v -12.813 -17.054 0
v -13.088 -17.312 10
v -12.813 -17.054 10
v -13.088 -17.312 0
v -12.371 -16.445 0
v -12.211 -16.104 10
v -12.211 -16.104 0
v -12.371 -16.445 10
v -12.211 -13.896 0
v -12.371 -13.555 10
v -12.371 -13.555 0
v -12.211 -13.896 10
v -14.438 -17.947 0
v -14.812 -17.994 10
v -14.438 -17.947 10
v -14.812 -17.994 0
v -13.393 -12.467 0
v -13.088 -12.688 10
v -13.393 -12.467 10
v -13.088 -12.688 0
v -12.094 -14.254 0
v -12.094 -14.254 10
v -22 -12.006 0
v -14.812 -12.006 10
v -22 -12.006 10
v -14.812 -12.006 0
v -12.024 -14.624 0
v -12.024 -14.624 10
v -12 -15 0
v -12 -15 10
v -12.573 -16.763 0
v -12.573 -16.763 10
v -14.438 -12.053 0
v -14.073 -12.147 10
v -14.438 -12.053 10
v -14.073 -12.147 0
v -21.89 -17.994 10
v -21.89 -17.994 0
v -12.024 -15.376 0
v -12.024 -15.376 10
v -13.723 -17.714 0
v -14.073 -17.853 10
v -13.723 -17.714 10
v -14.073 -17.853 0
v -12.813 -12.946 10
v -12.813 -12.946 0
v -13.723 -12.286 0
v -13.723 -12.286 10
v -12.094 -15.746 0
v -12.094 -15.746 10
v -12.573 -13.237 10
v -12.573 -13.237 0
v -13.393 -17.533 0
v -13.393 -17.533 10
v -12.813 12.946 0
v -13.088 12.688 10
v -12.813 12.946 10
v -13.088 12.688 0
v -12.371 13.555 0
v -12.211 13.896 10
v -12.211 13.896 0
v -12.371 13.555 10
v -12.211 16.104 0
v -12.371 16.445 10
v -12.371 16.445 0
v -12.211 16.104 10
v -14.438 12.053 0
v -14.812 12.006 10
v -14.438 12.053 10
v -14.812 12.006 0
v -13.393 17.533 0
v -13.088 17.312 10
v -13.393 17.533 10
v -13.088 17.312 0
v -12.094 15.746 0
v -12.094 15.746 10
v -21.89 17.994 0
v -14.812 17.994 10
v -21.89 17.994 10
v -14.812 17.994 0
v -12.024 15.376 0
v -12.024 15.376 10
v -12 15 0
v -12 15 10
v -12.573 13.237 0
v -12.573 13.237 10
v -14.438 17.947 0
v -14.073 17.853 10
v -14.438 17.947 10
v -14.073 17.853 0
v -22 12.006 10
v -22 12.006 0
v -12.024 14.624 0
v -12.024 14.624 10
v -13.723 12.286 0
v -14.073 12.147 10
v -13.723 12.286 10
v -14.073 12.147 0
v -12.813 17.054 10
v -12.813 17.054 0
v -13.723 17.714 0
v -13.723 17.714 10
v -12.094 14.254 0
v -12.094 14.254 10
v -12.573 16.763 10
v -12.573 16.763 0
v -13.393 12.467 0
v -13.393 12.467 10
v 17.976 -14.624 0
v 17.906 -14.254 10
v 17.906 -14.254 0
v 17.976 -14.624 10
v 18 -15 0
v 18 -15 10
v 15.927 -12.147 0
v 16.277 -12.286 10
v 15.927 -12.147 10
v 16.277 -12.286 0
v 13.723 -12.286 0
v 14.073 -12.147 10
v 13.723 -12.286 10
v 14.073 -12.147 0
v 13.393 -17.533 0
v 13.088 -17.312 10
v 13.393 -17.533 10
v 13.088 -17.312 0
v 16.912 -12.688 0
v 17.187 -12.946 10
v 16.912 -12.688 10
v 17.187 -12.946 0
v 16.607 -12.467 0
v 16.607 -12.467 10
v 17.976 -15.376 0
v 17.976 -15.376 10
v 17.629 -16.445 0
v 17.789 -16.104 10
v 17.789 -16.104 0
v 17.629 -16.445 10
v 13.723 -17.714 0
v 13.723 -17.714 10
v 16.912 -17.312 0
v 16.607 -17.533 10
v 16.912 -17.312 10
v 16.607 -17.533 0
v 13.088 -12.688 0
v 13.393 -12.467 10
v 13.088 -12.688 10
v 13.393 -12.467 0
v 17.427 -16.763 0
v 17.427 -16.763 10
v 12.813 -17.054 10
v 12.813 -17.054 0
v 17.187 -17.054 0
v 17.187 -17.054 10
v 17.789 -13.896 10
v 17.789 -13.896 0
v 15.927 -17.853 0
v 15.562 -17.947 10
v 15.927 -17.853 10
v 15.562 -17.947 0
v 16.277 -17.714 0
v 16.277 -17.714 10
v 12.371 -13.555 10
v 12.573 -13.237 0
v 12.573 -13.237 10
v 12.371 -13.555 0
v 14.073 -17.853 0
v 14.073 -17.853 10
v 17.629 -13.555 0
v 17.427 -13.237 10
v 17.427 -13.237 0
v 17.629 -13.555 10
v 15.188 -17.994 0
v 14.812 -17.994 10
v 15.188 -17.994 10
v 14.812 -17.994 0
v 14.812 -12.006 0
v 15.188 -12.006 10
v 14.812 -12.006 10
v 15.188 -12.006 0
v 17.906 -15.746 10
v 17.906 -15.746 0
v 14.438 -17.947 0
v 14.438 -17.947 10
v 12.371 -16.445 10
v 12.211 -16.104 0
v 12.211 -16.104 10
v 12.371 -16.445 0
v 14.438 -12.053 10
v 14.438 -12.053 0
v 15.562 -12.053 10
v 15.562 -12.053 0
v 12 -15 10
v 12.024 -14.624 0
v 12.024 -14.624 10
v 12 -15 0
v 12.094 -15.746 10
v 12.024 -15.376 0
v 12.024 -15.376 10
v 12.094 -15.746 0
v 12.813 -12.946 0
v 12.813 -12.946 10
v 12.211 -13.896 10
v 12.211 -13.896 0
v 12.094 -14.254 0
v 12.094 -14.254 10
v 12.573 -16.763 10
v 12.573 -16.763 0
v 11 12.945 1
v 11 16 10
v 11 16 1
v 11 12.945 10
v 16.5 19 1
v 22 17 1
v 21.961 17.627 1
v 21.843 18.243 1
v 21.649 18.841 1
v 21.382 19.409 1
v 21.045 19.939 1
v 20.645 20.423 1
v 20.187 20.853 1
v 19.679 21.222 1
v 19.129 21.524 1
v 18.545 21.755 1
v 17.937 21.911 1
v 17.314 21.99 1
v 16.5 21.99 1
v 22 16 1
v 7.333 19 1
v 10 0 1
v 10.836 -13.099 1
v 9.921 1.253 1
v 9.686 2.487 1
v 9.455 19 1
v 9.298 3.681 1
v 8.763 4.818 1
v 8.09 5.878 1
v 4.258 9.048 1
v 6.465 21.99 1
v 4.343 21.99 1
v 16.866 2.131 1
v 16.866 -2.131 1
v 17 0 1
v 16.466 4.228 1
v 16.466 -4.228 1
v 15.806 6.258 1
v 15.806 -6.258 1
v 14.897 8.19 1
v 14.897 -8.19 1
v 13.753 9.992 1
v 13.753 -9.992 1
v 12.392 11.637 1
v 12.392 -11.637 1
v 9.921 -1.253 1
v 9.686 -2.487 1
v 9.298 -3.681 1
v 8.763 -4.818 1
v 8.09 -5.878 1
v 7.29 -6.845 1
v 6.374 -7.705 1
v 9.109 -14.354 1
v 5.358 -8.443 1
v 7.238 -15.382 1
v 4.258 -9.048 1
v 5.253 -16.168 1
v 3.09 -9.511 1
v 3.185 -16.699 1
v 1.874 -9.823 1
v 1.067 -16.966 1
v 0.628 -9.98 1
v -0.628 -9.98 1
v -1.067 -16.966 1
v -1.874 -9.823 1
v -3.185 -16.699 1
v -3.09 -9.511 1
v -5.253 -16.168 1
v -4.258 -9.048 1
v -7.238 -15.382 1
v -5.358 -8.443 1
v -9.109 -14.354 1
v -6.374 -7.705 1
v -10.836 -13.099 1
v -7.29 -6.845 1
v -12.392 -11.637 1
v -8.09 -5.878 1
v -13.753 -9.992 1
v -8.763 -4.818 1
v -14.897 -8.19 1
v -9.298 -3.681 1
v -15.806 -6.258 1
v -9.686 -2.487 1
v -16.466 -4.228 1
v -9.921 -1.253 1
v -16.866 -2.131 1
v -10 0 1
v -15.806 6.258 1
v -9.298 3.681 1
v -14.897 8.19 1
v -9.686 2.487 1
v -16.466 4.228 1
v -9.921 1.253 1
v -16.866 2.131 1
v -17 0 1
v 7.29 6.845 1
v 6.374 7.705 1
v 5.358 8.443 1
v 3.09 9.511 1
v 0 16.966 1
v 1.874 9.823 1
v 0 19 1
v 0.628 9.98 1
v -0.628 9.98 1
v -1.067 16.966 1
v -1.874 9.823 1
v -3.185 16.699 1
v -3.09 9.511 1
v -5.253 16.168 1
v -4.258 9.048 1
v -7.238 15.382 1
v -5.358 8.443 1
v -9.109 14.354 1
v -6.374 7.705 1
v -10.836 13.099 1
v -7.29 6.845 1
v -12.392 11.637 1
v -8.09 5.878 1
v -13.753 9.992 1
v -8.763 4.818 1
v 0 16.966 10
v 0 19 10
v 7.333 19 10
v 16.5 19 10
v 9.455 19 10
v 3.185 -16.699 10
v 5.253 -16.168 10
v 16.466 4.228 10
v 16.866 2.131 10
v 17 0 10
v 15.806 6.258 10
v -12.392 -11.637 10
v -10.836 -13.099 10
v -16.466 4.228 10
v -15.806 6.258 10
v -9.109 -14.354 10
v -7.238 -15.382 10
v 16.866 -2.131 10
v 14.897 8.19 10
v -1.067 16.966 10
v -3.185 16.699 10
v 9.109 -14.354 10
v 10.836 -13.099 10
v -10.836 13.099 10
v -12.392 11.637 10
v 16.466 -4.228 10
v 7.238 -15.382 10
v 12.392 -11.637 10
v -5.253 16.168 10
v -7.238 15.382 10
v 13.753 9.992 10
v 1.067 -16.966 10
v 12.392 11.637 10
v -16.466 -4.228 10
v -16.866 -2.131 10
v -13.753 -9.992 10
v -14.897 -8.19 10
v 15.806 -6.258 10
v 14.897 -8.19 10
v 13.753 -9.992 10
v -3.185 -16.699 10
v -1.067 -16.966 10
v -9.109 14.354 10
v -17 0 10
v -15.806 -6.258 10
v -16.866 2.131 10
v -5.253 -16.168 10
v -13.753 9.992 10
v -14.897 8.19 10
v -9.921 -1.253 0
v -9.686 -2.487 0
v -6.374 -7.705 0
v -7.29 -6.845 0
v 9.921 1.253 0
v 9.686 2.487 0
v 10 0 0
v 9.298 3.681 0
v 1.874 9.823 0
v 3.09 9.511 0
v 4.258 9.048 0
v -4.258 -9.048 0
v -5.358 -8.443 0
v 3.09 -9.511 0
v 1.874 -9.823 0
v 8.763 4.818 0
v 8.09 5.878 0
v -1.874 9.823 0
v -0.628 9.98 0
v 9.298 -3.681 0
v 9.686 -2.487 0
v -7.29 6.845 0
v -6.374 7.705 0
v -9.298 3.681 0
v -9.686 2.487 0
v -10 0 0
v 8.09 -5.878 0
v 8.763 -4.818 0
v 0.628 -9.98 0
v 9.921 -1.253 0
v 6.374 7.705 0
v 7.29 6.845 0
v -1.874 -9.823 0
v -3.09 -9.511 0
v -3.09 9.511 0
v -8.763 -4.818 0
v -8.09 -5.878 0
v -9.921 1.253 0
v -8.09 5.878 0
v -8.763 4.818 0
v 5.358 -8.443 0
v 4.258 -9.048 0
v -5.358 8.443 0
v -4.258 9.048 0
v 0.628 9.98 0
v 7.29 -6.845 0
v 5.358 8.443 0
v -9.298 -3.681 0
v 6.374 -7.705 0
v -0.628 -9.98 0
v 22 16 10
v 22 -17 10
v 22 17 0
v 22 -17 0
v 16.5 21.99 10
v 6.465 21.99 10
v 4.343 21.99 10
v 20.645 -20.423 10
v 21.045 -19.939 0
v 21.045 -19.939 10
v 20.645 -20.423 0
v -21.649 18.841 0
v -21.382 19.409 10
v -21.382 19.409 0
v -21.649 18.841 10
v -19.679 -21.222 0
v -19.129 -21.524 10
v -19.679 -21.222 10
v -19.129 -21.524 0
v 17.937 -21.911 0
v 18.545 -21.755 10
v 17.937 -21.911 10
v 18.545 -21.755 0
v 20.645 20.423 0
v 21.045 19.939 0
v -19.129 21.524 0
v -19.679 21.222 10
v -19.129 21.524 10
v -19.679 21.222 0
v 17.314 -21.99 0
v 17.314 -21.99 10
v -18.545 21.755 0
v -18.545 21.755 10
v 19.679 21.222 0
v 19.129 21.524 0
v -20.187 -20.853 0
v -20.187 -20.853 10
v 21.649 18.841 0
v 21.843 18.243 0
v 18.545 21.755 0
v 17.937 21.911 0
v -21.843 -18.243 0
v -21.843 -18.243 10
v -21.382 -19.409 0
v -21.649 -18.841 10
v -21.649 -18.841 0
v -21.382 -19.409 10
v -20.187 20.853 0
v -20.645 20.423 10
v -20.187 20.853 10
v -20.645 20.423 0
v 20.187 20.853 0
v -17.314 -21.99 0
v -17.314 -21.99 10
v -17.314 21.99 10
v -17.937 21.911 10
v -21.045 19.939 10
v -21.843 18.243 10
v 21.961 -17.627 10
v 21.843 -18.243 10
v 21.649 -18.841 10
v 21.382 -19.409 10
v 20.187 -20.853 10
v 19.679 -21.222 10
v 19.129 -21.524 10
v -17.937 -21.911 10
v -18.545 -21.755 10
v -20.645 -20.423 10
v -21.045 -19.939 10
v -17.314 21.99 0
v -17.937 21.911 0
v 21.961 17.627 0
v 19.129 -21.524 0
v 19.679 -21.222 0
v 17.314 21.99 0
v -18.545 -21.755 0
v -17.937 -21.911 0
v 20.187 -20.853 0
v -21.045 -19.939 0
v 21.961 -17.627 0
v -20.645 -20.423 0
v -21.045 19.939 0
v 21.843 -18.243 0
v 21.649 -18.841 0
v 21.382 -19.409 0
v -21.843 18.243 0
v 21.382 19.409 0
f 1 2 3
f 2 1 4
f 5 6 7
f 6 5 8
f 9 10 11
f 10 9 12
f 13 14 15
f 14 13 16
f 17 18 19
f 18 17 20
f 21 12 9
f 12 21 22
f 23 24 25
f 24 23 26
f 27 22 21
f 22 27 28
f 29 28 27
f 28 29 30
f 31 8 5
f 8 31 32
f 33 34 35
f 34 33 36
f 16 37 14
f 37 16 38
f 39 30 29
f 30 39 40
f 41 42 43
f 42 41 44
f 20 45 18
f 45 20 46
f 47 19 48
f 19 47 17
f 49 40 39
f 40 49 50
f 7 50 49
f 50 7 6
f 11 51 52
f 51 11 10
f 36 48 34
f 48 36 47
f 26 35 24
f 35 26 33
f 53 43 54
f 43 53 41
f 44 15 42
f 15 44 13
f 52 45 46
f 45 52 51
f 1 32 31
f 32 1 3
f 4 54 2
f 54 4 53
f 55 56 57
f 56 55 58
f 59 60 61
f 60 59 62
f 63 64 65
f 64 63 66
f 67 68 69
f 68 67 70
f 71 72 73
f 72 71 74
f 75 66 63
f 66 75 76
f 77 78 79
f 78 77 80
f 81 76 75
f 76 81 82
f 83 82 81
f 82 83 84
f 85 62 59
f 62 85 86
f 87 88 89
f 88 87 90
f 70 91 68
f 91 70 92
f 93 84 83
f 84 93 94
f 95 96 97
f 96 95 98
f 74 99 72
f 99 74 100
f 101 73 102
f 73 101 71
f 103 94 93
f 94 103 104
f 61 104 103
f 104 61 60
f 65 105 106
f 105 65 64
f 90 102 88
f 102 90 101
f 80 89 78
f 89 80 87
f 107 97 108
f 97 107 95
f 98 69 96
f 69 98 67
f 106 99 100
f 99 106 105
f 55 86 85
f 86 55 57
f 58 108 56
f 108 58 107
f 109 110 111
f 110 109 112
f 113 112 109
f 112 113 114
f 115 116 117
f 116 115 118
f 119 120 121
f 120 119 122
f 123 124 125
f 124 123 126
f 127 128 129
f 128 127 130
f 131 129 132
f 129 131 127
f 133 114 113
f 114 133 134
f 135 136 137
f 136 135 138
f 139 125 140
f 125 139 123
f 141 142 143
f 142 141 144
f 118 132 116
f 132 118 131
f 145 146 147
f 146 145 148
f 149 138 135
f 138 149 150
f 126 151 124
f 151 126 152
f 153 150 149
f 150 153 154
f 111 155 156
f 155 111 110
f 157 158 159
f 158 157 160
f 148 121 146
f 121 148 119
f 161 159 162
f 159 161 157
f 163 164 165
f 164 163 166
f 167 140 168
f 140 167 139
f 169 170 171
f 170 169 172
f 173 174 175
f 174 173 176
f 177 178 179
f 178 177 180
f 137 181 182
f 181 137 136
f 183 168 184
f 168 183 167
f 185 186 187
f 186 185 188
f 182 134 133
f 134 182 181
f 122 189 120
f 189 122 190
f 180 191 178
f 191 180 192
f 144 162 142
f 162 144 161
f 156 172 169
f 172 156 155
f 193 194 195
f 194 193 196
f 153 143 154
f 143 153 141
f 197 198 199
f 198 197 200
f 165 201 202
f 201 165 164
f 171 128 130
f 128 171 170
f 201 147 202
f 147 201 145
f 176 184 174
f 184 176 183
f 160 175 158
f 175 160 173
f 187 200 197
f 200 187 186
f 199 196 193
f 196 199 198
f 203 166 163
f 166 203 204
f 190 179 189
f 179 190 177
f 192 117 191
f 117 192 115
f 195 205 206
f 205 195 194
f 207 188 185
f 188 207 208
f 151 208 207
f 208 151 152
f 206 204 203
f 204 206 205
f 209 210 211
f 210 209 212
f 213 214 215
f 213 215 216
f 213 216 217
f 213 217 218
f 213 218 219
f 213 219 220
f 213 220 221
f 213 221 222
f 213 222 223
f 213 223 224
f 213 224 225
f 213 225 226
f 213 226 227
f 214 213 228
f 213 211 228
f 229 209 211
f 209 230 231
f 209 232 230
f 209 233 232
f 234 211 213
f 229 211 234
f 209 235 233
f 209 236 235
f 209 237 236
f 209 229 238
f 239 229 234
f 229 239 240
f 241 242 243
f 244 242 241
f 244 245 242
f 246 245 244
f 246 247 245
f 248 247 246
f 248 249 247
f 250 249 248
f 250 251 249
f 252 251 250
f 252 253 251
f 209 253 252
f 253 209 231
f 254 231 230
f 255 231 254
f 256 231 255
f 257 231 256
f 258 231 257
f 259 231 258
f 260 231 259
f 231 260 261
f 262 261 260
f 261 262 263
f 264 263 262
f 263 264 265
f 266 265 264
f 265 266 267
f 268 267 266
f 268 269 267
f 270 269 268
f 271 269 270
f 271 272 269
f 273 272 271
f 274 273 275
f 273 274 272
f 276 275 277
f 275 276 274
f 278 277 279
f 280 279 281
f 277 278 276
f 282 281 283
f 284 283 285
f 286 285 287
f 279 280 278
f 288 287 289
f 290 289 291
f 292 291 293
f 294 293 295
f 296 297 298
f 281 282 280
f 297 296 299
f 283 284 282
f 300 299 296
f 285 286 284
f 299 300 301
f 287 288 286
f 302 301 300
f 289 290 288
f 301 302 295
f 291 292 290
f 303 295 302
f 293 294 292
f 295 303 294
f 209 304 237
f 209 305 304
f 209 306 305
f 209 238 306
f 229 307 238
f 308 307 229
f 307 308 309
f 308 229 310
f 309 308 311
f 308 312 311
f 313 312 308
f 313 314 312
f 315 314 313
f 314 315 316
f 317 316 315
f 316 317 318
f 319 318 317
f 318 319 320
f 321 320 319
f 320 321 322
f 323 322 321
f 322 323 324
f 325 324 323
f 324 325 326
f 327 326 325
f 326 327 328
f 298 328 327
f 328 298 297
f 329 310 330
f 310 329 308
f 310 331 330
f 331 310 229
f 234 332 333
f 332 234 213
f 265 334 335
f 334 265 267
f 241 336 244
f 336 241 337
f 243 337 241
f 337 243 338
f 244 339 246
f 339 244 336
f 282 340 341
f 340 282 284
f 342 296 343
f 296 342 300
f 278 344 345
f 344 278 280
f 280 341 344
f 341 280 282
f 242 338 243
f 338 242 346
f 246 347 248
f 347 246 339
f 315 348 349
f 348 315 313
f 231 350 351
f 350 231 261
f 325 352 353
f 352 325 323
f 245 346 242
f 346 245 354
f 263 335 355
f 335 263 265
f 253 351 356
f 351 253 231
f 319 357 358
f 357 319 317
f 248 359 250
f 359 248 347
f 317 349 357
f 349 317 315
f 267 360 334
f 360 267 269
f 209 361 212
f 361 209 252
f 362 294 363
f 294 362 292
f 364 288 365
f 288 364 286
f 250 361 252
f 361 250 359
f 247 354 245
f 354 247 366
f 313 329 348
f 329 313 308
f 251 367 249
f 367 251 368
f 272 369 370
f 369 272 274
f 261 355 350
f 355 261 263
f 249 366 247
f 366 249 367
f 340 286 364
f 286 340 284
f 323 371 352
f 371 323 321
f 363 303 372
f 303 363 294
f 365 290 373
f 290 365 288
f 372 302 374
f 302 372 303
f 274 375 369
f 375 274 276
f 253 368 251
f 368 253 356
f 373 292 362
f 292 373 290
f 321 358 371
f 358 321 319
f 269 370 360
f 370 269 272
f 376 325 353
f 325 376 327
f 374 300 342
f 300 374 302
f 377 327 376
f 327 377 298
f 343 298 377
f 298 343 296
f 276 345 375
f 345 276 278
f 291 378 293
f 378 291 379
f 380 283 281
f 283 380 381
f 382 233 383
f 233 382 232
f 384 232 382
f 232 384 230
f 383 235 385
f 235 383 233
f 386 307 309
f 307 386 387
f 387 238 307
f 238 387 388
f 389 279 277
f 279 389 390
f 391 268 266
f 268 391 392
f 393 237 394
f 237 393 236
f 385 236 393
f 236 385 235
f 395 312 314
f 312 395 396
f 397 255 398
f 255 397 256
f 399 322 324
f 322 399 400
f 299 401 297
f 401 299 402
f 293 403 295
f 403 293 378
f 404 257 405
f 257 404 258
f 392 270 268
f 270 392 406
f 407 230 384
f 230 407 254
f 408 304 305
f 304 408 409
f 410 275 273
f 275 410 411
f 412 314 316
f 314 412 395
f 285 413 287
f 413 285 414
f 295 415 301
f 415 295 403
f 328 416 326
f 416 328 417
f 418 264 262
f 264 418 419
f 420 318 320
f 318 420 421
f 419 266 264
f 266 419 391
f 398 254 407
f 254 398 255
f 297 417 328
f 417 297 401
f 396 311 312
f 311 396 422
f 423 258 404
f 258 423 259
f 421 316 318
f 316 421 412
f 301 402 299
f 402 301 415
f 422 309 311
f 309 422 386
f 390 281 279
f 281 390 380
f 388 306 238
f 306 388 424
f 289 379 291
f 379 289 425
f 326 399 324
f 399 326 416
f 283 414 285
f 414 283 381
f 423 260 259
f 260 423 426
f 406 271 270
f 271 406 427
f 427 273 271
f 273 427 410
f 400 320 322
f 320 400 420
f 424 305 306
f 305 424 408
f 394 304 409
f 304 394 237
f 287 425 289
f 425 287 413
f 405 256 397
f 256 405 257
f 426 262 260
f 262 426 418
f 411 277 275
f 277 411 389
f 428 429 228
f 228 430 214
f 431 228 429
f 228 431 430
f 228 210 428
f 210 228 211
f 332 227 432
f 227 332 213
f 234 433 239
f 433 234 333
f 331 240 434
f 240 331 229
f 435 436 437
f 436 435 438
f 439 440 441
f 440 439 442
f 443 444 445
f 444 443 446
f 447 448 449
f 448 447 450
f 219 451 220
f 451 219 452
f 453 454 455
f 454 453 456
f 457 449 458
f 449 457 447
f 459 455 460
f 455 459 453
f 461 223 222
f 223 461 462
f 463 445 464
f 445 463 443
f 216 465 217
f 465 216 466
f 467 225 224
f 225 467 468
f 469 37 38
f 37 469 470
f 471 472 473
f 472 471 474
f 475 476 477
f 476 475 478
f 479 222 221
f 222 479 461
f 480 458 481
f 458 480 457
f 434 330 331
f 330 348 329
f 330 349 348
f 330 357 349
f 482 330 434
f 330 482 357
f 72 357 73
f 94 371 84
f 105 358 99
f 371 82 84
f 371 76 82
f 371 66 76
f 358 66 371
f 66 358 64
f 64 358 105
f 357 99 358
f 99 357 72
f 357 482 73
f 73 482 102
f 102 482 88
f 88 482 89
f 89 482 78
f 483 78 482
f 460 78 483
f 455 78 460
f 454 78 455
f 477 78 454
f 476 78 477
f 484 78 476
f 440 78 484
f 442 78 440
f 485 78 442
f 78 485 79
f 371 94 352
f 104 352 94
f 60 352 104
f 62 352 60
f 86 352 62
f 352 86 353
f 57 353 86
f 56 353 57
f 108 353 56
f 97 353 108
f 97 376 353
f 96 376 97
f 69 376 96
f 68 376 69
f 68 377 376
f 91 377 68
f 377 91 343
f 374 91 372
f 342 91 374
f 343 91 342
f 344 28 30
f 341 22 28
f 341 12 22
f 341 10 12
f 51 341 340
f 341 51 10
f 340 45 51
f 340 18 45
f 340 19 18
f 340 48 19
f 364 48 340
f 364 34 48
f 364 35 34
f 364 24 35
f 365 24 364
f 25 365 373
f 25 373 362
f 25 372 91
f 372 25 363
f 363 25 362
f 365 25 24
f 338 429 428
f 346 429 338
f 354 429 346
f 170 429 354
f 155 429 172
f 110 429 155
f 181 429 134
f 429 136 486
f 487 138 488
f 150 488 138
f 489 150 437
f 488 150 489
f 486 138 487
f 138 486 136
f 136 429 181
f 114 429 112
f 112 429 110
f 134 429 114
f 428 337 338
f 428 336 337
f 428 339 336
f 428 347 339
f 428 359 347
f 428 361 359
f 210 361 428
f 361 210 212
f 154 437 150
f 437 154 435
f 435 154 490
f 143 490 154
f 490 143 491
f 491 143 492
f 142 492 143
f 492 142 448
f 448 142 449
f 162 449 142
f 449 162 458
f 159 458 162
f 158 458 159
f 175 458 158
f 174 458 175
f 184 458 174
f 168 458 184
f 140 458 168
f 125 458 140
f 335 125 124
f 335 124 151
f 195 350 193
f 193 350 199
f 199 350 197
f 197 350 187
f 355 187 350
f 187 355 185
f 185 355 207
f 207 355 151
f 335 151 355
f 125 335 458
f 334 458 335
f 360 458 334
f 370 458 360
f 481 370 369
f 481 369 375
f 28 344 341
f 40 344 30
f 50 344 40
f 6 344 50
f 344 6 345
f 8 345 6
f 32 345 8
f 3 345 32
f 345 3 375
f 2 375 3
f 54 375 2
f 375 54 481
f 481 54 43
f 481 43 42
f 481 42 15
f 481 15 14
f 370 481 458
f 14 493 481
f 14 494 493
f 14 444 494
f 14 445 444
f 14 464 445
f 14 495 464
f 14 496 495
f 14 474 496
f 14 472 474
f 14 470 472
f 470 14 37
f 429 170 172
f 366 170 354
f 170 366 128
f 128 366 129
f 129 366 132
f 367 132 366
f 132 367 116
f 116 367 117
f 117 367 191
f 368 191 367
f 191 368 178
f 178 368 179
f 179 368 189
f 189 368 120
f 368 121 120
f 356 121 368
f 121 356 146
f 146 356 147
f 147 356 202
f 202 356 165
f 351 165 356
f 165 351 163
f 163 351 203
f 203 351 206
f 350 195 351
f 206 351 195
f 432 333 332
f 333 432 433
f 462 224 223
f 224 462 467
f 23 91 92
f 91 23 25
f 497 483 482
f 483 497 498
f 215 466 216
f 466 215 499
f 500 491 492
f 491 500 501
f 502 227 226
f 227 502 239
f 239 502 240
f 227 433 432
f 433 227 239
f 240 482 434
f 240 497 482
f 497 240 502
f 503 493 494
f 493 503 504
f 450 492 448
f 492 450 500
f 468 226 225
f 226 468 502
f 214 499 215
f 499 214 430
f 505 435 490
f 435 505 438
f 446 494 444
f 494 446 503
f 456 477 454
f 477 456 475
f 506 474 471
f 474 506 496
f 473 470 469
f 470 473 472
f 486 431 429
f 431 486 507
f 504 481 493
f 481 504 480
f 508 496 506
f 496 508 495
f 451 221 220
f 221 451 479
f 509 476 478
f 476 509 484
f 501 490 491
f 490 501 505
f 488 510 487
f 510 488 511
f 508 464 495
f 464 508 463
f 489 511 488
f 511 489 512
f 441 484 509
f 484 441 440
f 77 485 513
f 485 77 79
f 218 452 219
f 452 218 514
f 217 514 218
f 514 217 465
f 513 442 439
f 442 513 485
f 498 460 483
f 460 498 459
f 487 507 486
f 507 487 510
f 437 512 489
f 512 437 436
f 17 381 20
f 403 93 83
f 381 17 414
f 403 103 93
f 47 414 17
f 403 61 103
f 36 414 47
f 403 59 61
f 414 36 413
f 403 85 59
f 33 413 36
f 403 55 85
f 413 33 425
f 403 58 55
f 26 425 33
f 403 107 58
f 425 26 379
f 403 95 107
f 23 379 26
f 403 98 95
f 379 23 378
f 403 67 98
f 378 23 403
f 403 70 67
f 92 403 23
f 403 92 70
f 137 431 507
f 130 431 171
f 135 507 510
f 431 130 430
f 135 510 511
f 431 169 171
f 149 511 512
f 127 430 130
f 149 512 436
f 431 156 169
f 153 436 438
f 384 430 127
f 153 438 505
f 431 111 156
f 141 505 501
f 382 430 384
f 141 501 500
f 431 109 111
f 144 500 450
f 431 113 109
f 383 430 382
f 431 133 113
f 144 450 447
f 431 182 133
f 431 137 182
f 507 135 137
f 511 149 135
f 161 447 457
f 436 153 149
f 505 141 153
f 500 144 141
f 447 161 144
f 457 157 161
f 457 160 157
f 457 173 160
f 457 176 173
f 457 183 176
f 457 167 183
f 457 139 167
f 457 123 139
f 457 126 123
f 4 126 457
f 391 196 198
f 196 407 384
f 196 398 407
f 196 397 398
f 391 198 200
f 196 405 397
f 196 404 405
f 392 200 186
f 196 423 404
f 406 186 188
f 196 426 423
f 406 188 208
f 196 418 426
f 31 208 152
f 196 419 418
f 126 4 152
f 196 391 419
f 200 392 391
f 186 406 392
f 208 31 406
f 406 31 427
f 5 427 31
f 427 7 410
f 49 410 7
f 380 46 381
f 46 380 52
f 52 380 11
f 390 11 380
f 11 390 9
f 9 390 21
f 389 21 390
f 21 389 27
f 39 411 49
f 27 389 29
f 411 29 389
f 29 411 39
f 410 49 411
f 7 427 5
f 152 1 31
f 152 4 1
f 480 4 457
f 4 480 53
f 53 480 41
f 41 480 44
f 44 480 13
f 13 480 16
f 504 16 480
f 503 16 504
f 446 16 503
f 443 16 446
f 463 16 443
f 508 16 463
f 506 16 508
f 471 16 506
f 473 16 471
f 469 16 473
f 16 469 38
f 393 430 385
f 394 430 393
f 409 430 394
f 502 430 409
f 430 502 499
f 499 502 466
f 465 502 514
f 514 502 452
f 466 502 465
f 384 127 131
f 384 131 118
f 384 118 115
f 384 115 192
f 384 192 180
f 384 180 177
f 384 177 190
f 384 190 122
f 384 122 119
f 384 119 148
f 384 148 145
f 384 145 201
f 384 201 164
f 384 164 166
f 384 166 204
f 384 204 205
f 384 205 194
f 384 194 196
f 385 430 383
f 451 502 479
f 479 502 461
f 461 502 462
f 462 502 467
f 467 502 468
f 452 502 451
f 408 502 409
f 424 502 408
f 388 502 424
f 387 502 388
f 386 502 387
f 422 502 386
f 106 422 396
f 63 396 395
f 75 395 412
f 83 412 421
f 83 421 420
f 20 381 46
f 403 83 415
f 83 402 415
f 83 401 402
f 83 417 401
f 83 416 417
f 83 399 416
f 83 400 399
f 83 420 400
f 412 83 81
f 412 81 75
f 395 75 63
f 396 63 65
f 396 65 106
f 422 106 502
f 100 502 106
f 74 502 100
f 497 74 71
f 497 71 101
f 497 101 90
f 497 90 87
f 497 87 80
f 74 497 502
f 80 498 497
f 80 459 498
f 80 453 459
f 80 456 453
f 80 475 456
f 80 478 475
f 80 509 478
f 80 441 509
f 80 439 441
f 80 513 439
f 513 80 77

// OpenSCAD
$fn = 50;


difference() {
	union() {
		translate(v = [0, 0, 0]) {
			rotate(a = [0, 0, 0]) {
				hull() {
					translate(v = [-17.0000000000, 17.0000000000, 0]) {
						rotate(a = [0, 0, 0]) {
							translate(v = [0, 0, 0]) {
								rotate(a = [0, 0, 0]) {
									cylinder(h = 10, r = 5);
								}
							}
						}
					}
					translate(v = [17.0000000000, 17.0000000000, 0]) {
						rotate(a = [0, 0, 0]) {
							translate(v = [0, 0, 0]) {
								rotate(a = [0, 0, 0]) {
									cylinder(h = 10, r = 5);
								}
							}
						}
					}
					translate(v = [-17.0000000000, -17.0000000000, 0]) {
						rotate(a = [0, 0, 0]) {
							translate(v = [0, 0, 0]) {
								rotate(a = [0, 0, 0]) {
									cylinder(h = 10, r = 5);
								}
							}
						}
					}
					translate(v = [17.0000000000, -17.0000000000, 0]) {
						rotate(a = [0, 0, 0]) {
							translate(v = [0, 0, 0]) {
								rotate(a = [0, 0, 0]) {
									cylinder(h = 10, r = 5);
								}
							}
						}
					}
				}
			}
		}
	}
	union() {
		translate(v = [-22.5000000000, -15.0000000000, -125]) {
			rotate(a = [0, 0, 0]) {
				hull() {
					translate(v = [7.5000000000, 0, 0]) {
						rotate(a = [0, 0, 0]) {
							translate(v = [0, 0, 0]) {
								rotate(a = [0, 0, 0]) {
									cylinder(h = 250, r = 3.0000000000);
								}
							}
						}
					}
					translate(v = [-7.5000000000, 0, 0]) {
						rotate(a = [0, 0, 0]) {
							translate(v = [0, 0, 0]) {
								rotate(a = [0, 0, 0]) {
									cylinder(h = 250, r = 3.0000000000);
								}
							}
						}
					}
				}
			}
		}
		translate(v = [-22.5000000000, 15.0000000000, -125]) {
			rotate(a = [0, 0, 0]) {
				hull() {
					translate(v = [7.5000000000, 0, 0]) {
						rotate(a = [0, 0, 0]) {
							translate(v = [0, 0, 0]) {
								rotate(a = [0, 0, 0]) {
									cylinder(h = 250, r = 3.0000000000);
								}
							}
						}
					}
					translate(v = [-7.5000000000, 0, 0]) {
						rotate(a = [0, 0, 0]) {
							translate(v = [0, 0, 0]) {
								rotate(a = [0, 0, 0]) {
									cylinder(h = 250, r = 3.0000000000);
								}
							}
						}
					}
				}
			}
		}
		translate(v = [15.0000000000, -15.0000000000, -125.0000000000]) {
			rotate(a = [0, 0, 0]) {
				cylinder(h = 250, r = 3.0000000000);
			}
		}
		translate(v = [0.0000000000, 11.0000000000, 1.0000000000]) {
			rotate(a = [0, 0, 0]) {
				cube(size = [11, 8, 12]);
			}
		}
		translate(v = [0, 0, 1.0000000000]) {
			rotate(a = [0, 0, 0]) {
				cylinder(h = 12, r = 17.0000000000);
			}
		}
		translate(v = [0, 0, -5.0000000000]) {
			rotate(a = [0, 0, 0]) {
				cylinder(h = 10, r = 10.0000000000);
			}
		}
		translate(v = [0.0000000000, 16.0000000000, 1]) {
			rotate(a = [0, 0, 0]) {
				cube(size = [22.0000000000, 3, 12]);
			}
		}
		translate(v = [16.5000000000, 16.0000000000, 1]) {
			rotate(a = [0, 0, 0]) {
				cube(size = [5.5000000000, 6, 12]);
			}
		}
		translate(v = [3.5833333333, 22.7500000000, 1]) {
			rotate(a = [0, 0, -45]) {
				cube(size = [7.5000000000, 1.5000000000, 12]);
			}
		}
	}
}
